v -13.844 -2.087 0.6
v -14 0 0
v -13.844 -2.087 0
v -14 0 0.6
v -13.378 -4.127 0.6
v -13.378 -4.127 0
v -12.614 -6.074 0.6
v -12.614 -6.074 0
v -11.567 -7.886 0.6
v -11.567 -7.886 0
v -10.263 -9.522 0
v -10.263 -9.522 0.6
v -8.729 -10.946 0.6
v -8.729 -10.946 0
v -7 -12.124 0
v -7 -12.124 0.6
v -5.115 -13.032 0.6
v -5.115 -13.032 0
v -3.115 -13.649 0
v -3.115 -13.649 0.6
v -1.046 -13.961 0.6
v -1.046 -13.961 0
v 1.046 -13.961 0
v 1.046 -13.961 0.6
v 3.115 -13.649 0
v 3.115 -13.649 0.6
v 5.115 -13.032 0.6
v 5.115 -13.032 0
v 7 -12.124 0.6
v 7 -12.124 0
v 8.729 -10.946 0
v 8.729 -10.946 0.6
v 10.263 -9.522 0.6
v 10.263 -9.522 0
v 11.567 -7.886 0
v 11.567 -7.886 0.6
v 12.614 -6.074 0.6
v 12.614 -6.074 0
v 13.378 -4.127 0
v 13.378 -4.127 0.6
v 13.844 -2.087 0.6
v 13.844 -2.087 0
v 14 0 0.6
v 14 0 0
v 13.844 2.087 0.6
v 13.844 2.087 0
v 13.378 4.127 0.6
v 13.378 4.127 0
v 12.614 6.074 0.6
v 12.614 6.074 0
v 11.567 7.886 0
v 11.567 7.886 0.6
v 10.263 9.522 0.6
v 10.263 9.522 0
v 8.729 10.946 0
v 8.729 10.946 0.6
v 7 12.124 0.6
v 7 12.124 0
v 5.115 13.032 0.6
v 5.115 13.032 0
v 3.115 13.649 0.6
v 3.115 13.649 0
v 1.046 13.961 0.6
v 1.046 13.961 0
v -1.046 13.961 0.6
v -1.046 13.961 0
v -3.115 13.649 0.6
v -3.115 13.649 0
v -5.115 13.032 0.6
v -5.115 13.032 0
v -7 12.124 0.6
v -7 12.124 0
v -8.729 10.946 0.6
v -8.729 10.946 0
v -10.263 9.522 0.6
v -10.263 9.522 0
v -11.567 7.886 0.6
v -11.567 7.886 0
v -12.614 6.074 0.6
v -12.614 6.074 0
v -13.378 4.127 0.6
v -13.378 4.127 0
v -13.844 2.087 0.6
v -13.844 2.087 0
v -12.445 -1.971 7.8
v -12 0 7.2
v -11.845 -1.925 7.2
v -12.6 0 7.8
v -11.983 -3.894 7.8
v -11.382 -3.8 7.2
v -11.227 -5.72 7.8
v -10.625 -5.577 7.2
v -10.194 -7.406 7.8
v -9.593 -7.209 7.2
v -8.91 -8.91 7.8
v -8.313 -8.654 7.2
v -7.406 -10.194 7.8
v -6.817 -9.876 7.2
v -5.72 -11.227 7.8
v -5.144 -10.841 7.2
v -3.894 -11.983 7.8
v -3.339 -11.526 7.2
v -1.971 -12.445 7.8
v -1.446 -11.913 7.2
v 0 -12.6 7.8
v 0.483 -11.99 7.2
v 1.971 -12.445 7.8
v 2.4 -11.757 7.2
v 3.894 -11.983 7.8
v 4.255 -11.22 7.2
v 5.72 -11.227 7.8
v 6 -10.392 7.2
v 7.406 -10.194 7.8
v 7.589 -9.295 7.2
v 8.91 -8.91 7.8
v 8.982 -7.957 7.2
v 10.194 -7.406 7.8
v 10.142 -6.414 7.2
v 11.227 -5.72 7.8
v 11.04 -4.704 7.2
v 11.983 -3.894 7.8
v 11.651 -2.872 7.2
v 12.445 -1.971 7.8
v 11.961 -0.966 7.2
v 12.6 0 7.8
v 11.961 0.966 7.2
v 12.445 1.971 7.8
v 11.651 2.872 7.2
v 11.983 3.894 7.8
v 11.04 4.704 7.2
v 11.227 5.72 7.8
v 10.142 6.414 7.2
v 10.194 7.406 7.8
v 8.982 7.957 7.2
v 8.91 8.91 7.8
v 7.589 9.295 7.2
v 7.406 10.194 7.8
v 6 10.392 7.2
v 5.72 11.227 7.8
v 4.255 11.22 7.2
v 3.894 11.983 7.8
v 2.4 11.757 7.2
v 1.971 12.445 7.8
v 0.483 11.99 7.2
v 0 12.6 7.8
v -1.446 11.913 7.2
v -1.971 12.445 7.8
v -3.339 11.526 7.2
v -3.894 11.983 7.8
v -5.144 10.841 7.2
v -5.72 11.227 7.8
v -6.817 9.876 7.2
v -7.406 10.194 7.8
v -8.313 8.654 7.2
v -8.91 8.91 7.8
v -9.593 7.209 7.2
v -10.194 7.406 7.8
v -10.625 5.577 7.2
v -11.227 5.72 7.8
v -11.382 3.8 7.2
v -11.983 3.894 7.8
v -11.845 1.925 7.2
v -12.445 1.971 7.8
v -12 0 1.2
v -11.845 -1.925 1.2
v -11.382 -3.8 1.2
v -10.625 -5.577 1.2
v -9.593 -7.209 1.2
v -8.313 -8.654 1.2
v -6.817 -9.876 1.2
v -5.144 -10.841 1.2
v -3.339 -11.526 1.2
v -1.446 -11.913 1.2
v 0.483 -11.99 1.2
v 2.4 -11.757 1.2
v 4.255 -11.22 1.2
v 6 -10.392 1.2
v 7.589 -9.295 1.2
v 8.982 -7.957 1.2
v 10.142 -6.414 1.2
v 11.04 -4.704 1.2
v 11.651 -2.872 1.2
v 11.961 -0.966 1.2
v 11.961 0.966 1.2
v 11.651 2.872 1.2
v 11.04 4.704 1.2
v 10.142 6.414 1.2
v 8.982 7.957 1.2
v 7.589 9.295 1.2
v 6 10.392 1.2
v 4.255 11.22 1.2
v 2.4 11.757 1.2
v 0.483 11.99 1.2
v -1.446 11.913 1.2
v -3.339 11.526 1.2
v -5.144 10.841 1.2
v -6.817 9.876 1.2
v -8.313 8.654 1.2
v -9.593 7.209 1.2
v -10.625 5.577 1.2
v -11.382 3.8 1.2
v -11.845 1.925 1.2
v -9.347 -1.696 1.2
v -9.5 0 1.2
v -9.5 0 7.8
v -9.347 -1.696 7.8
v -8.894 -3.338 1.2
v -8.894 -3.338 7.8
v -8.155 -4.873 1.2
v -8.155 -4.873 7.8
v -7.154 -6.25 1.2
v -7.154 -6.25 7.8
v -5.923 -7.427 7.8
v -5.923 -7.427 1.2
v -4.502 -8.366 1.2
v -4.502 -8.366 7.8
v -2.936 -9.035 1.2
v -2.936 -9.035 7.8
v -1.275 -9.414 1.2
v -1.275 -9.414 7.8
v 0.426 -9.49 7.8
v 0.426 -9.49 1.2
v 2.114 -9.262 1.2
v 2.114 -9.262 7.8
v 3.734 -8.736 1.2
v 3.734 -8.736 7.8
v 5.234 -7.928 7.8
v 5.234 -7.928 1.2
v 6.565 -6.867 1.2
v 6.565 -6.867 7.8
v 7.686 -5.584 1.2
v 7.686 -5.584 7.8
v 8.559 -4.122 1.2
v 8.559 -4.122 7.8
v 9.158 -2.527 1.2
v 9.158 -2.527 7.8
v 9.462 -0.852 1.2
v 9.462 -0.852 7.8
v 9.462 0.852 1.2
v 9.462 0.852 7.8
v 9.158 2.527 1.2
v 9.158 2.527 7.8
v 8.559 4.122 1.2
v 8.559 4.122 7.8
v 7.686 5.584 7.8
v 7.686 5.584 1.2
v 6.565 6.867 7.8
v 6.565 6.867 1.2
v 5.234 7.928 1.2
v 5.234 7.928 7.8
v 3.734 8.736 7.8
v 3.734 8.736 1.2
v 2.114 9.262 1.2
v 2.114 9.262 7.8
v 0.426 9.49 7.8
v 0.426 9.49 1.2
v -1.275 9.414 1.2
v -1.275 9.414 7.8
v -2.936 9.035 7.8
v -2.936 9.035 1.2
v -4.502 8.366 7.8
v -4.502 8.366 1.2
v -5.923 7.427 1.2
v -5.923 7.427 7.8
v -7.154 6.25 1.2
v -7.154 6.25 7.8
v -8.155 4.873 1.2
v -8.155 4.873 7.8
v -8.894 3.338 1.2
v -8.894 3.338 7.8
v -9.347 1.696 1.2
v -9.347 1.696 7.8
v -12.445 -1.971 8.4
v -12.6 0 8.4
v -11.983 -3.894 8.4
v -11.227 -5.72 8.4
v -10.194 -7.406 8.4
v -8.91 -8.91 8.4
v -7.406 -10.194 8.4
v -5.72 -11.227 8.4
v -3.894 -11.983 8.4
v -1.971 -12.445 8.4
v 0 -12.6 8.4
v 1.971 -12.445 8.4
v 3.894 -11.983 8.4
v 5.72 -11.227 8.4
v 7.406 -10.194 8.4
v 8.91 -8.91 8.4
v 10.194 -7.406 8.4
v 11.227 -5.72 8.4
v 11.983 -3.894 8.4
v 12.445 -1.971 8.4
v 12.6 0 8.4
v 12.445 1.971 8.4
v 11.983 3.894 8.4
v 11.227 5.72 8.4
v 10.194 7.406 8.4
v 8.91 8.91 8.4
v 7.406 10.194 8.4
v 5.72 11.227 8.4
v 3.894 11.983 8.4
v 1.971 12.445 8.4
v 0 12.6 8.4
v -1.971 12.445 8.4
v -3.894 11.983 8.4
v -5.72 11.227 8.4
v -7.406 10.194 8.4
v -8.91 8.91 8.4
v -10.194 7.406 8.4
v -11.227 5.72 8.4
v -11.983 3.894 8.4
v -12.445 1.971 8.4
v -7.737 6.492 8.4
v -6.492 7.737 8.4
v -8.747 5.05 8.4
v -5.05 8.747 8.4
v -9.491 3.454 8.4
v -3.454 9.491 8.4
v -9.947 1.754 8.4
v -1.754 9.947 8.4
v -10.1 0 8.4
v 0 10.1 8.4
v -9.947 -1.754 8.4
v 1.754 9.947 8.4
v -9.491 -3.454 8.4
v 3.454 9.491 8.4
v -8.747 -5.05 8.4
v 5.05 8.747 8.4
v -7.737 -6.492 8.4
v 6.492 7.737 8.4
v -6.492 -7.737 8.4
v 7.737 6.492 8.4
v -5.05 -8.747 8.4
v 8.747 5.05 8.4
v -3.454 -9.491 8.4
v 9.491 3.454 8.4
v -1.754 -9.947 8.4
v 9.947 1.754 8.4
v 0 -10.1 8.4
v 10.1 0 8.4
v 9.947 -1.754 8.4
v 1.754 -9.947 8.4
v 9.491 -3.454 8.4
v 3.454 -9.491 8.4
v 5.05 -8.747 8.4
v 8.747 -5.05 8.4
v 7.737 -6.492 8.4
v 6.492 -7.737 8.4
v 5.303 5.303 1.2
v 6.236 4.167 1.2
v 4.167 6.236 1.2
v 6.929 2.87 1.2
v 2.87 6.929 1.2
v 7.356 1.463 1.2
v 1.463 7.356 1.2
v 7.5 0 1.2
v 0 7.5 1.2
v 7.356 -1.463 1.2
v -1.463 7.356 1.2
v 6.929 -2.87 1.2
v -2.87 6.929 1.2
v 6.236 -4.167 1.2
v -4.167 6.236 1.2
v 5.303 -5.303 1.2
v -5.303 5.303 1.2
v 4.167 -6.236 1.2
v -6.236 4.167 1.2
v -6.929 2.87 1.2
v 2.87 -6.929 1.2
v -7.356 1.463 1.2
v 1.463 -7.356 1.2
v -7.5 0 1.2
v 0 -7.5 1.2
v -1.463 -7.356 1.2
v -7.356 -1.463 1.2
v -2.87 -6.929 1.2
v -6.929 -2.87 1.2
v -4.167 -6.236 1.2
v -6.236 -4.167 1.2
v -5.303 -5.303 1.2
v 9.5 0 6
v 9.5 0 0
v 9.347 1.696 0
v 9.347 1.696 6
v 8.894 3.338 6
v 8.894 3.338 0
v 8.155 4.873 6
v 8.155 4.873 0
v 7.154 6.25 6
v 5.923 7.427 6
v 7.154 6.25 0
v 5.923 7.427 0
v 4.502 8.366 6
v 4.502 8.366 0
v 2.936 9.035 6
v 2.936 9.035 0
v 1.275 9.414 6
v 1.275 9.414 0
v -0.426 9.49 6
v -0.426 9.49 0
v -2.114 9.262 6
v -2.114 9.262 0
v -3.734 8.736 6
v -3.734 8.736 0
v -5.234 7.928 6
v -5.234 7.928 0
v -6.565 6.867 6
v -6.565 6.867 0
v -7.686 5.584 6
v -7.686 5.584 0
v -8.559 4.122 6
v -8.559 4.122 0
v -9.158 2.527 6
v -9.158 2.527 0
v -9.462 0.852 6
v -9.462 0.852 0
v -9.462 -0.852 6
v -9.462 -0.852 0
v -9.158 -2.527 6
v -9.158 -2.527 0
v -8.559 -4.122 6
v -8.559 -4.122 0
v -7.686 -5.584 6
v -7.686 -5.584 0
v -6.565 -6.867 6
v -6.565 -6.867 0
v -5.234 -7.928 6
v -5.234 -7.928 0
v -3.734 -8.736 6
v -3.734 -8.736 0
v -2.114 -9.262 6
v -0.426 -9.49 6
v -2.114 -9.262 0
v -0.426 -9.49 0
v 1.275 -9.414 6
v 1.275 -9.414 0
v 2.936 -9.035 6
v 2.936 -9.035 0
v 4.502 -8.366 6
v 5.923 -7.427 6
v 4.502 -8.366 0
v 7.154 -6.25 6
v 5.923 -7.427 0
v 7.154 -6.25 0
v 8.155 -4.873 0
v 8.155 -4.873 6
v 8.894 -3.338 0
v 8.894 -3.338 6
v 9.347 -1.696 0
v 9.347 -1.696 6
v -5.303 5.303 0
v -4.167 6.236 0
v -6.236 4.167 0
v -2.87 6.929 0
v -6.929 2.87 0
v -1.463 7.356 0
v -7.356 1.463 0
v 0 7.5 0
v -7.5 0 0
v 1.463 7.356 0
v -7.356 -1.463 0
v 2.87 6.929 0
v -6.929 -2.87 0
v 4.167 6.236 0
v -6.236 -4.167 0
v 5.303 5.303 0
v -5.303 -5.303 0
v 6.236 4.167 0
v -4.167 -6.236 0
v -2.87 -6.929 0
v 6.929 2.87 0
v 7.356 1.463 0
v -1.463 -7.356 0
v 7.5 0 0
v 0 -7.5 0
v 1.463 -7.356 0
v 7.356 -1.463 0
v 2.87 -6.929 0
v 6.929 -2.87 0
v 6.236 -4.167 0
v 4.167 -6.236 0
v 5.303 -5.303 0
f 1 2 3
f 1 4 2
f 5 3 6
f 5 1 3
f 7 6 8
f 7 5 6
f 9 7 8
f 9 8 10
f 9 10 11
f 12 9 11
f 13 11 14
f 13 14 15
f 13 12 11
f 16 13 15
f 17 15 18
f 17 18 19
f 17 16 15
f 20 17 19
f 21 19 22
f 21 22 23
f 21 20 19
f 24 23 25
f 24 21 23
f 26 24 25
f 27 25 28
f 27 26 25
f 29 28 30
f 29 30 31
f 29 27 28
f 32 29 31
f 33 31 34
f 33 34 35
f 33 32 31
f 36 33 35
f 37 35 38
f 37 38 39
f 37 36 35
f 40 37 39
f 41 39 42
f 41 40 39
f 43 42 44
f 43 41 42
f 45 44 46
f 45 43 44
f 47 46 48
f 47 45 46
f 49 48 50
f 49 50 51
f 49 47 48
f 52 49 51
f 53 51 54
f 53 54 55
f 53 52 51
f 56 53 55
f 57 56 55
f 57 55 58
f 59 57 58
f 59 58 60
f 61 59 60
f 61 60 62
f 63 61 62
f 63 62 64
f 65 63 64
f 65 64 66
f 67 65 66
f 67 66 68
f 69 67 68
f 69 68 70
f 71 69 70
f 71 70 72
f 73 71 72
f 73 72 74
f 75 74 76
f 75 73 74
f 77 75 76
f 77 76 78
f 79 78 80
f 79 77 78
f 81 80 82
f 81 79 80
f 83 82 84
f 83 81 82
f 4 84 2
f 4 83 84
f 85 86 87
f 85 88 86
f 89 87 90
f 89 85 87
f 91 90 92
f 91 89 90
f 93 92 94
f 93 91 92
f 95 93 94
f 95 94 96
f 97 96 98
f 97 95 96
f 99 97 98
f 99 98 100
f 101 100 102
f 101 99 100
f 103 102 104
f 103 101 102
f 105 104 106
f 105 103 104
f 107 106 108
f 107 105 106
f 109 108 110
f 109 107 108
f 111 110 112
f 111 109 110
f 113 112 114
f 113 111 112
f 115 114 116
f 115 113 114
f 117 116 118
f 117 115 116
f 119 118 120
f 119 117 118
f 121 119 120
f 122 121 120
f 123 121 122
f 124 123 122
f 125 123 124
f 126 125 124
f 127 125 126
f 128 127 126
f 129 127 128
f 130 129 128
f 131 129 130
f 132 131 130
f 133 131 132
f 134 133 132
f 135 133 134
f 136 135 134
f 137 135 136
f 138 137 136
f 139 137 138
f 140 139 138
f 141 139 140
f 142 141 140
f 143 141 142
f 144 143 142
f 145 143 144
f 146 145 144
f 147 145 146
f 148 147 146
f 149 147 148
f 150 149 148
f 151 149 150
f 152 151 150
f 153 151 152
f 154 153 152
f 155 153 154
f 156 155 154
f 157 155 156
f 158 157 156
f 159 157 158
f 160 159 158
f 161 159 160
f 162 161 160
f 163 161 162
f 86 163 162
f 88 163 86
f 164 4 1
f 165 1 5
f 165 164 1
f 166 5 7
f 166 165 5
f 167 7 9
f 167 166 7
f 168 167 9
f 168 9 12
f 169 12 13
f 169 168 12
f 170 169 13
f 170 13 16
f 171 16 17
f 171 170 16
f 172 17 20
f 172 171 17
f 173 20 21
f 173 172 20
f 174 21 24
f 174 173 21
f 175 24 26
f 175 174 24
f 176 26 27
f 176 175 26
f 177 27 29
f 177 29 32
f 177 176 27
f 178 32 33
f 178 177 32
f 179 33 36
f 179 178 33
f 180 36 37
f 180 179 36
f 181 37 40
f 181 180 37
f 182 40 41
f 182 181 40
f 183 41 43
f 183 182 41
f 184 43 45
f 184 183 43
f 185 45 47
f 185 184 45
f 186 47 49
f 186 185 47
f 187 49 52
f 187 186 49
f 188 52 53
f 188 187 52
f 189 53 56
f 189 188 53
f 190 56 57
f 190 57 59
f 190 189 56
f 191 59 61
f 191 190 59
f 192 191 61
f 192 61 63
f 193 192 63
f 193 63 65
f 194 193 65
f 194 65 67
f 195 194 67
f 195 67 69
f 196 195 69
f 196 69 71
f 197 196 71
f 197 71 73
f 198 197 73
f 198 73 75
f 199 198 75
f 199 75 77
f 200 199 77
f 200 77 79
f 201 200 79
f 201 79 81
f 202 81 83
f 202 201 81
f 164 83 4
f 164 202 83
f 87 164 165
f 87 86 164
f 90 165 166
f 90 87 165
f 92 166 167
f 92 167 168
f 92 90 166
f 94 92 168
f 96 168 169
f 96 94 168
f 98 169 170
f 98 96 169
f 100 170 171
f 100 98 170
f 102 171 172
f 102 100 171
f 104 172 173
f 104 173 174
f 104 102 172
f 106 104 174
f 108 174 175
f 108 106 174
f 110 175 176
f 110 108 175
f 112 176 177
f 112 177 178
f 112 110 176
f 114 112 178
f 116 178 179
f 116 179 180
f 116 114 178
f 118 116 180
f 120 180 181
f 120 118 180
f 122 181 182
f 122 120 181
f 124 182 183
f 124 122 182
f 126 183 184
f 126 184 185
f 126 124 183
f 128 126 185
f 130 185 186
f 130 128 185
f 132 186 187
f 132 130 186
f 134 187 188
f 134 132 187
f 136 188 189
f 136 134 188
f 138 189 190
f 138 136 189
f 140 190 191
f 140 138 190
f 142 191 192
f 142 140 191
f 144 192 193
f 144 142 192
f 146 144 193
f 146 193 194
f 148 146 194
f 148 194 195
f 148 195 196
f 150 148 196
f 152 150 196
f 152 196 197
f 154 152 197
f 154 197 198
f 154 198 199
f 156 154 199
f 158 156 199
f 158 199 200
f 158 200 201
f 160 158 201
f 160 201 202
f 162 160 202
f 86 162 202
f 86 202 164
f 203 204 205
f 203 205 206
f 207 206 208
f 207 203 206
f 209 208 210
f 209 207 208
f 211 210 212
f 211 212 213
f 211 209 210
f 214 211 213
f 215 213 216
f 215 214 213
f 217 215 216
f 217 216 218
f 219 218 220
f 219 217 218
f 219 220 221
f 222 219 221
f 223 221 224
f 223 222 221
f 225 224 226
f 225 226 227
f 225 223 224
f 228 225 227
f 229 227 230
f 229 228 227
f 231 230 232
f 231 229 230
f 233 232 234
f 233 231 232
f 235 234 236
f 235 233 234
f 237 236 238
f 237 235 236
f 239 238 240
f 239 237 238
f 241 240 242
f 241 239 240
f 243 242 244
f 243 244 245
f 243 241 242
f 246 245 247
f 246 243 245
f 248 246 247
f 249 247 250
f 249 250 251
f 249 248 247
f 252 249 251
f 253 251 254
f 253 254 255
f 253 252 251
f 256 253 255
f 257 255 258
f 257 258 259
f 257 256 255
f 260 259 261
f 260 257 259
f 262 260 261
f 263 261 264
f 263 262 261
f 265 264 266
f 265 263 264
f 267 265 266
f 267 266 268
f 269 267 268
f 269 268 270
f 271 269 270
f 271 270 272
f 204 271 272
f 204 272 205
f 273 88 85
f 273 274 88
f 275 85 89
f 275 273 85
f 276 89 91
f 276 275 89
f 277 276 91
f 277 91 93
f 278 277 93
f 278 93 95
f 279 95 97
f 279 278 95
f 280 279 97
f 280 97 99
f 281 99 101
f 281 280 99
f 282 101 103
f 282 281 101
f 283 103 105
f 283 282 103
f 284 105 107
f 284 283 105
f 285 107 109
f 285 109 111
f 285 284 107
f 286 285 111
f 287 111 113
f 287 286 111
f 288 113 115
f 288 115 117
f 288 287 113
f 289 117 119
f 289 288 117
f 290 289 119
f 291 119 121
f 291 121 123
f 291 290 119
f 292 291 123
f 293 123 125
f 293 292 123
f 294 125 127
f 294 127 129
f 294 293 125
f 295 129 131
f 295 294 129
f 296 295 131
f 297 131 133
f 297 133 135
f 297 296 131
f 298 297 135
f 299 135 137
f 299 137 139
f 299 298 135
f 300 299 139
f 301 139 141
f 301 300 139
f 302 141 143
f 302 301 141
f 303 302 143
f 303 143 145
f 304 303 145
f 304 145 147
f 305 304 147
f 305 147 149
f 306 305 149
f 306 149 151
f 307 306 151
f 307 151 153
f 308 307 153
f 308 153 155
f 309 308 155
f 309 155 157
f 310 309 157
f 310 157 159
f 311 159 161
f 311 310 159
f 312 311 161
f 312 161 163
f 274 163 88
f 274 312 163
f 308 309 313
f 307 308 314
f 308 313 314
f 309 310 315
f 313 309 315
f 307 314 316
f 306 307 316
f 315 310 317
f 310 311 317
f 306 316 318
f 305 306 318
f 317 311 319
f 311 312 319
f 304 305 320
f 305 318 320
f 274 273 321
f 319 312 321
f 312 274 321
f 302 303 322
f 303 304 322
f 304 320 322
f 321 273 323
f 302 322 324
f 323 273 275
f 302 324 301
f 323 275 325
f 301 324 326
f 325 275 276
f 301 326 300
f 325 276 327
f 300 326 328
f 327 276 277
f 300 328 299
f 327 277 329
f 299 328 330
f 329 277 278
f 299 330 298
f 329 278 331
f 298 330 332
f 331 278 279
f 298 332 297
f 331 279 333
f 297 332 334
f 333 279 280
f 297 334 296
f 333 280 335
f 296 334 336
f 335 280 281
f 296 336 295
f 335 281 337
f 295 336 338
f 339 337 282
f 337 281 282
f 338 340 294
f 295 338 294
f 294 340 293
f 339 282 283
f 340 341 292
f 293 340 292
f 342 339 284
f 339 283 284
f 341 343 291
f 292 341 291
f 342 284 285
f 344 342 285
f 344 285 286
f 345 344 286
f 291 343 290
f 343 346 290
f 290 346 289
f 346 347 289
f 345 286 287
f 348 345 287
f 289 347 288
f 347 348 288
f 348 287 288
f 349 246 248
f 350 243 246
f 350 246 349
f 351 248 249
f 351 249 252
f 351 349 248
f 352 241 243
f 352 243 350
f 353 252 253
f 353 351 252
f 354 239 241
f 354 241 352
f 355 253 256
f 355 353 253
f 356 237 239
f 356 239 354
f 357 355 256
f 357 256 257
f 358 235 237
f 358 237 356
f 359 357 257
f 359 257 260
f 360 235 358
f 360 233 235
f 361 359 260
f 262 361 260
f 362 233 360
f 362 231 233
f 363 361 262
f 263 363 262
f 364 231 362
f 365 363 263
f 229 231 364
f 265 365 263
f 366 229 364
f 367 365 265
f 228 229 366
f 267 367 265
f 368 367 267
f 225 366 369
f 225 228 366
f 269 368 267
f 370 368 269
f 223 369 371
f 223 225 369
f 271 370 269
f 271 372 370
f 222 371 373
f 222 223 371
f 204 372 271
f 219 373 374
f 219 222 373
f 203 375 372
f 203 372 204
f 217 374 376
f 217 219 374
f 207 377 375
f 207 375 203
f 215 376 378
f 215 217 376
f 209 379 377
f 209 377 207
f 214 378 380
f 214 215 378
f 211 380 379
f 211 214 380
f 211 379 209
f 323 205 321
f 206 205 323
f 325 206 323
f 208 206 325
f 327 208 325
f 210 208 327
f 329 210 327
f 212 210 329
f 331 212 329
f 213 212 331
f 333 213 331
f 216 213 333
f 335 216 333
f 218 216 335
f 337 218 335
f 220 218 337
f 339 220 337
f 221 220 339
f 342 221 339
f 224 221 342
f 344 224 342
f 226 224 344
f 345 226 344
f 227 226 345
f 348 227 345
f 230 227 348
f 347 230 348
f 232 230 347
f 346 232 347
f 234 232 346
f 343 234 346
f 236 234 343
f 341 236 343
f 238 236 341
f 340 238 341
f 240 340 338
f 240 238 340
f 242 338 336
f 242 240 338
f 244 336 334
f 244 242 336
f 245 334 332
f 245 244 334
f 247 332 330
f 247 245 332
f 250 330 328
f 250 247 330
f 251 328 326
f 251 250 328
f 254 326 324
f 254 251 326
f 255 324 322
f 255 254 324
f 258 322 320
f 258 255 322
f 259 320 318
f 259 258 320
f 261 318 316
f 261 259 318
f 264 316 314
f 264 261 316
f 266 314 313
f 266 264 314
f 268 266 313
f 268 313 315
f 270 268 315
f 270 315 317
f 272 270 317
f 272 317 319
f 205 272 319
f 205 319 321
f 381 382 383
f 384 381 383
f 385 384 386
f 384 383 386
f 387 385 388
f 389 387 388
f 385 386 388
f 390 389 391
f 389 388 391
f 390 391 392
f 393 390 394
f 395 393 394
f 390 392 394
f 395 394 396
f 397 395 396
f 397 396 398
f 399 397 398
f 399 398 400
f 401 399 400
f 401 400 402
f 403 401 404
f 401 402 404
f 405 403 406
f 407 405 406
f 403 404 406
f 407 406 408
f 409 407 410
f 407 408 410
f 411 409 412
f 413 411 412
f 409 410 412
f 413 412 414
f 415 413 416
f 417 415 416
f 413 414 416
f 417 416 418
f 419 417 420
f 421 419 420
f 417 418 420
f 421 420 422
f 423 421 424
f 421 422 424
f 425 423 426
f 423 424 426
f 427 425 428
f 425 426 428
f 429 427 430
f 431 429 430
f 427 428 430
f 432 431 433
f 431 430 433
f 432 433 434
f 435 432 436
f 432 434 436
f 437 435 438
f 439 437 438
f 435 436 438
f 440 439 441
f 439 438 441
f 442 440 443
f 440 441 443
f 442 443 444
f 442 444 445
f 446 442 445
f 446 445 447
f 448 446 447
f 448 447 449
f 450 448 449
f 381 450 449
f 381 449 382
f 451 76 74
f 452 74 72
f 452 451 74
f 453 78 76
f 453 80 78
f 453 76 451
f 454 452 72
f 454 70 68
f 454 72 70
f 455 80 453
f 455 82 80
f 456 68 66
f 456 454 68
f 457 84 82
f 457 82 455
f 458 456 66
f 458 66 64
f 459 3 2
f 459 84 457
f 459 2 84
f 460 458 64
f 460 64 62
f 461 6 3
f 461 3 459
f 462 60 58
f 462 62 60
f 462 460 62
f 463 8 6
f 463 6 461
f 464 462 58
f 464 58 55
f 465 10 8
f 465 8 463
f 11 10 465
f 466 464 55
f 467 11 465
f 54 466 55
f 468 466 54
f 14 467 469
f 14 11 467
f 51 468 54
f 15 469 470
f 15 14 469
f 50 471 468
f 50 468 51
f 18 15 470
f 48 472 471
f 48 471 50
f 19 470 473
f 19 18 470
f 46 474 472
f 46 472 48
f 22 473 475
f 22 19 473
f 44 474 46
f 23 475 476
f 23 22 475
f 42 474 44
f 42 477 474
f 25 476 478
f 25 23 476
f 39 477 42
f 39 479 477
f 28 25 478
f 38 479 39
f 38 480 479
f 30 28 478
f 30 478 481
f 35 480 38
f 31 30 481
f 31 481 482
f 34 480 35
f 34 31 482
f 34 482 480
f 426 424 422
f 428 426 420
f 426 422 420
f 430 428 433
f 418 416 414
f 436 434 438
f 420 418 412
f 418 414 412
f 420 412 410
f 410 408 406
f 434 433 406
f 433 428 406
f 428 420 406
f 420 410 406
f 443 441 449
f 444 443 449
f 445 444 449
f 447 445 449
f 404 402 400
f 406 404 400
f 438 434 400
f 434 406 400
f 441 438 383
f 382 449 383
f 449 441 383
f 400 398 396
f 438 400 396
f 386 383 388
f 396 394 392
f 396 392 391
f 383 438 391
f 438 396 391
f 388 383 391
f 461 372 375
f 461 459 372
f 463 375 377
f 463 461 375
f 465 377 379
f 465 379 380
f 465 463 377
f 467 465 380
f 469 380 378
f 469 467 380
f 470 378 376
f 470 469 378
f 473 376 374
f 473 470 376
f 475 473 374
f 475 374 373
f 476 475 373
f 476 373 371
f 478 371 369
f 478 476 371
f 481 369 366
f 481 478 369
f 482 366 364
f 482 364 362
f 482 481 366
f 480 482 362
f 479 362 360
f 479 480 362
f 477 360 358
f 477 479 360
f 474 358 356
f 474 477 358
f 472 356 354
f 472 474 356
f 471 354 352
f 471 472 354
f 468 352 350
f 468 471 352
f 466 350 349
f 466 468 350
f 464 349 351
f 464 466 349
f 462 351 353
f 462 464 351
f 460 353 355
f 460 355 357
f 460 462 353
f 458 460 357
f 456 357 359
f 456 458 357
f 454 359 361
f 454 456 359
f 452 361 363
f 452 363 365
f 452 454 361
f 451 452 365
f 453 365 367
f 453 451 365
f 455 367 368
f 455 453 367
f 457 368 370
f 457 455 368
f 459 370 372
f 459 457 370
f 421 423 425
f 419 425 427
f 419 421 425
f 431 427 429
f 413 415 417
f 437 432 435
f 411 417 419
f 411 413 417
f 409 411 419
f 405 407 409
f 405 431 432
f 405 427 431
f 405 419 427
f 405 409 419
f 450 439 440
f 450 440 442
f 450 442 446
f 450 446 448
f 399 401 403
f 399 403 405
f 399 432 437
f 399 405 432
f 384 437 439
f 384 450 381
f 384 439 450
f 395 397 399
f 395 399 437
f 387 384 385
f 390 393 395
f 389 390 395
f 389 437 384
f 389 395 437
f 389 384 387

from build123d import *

# Parameters (mm, degrees)
CYLINDER_R     = 9.5
CYLINDER_DEPTH = 6
CHAMFER_SIZE   = 0.6


with BuildPart() as cylinder:
    # Cylinder → Cylinder (new body)
    with BuildSketch(Plane.XY):
        Circle(CYLINDER_R)
    extrude(amount=CYLINDER_DEPTH)


with BuildPart() as chamfer_body:
    # Sketch → Revolution (revolve)
    with BuildSketch(Plane.XZ):
        Polygon((-14, 0), (-14, 0.6), (-12, 1.2), (-12, 7.2), (-12.6, 7.8), (-12.6, 8.4), (-12, 8.4), (-9.5, 8.4), (-9.5, 1.2), (-7.5, 1.2), (-7.5, 0), align=None)
    revolve(axis=Axis((0, 0, 0), (0, 0, 1)))

    # Chamfer
    chamfer_edges = [chamfer_body.edges().sort_by_distance(p)[0] for p in [
        (9.5, 0, 8.4),
    ]]
    chamfer(chamfer_edges, length=CHAMFER_SIZE)


solid = Compound([cylinder.part, chamfer_body.part])
